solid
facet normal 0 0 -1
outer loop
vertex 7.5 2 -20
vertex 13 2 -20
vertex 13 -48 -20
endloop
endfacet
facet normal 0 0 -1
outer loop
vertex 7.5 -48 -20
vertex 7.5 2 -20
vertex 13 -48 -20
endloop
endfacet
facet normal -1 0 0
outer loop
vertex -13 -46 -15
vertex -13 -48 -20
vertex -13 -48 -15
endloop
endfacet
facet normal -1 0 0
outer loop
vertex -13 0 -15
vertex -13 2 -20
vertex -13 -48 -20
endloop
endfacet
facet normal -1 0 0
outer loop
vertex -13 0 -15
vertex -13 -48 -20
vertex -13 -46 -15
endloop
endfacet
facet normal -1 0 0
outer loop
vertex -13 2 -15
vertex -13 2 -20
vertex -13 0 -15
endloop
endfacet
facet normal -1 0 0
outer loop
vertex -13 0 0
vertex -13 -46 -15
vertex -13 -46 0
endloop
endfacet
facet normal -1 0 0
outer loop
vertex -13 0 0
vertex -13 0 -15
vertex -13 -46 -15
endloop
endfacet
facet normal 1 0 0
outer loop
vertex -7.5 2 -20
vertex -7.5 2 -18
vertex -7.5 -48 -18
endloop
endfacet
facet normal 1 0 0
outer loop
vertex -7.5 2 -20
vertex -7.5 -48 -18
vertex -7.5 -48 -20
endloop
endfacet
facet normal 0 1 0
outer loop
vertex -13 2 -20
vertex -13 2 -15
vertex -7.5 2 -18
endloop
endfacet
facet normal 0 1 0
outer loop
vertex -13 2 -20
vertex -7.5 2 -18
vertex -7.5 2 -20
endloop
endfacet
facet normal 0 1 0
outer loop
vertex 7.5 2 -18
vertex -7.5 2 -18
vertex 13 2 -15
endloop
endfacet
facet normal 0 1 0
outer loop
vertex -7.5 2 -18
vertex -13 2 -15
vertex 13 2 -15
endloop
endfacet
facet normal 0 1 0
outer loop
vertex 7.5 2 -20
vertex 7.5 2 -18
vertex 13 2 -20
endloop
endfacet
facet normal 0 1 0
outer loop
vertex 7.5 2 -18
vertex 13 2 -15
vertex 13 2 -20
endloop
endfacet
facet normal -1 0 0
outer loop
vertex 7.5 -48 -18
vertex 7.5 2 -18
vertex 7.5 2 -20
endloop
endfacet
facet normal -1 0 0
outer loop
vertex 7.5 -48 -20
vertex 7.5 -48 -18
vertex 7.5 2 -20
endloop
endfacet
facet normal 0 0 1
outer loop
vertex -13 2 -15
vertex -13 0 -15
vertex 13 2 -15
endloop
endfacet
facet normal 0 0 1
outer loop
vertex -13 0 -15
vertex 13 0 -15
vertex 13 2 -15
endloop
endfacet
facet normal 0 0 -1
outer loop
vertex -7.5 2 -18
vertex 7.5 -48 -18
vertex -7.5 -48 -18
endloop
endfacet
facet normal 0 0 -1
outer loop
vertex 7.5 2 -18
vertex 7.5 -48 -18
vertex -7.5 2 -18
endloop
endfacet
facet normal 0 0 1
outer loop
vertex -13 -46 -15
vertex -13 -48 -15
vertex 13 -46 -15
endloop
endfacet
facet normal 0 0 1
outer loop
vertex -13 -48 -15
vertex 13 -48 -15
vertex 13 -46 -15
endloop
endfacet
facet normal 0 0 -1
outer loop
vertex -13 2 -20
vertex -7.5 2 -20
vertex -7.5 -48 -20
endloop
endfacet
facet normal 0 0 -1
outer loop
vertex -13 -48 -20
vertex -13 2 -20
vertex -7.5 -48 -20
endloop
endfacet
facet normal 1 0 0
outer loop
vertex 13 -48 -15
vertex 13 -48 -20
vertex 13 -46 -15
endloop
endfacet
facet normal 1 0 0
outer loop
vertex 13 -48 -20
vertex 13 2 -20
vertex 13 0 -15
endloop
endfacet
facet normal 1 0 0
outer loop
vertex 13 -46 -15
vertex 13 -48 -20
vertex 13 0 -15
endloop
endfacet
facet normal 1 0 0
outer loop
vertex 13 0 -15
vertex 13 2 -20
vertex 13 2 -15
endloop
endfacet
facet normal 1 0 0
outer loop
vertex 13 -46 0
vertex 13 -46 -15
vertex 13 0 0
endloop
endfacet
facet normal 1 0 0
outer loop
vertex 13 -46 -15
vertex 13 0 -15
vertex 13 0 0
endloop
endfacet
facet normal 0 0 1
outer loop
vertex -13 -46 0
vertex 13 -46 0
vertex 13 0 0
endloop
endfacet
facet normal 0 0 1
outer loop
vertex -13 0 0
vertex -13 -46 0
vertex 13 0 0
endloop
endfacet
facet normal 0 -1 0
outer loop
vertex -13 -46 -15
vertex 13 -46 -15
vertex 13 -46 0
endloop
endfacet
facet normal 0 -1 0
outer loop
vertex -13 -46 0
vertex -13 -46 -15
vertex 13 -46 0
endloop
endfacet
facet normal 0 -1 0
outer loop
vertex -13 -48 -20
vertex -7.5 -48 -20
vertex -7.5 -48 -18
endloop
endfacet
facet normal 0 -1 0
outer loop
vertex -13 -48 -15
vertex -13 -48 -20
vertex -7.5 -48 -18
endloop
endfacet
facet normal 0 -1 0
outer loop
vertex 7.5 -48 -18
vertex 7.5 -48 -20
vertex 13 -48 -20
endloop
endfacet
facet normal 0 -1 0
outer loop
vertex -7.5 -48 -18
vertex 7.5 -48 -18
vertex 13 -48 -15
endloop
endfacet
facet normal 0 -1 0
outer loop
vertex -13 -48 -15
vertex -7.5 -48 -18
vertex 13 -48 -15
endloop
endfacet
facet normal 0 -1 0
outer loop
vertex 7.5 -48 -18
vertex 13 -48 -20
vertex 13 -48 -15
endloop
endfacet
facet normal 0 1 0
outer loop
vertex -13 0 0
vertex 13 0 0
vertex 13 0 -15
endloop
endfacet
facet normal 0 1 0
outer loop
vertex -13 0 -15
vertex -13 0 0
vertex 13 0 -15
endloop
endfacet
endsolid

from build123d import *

# Parameters (mm, degrees)
EXTRUDE_1_DEPTH     = 13
SKETCH_4_W          = 20
SKETCH_4_H          = 60
CUT_EXTRUDE_1_DEPTH = 7.5


with BuildPart() as part:
    # 스케치2 → 보스-돌출1 (new, symmetric)
    with BuildSketch(Plane(origin=(0, 0, 0), x_dir=(0, 0, -1), z_dir=(1, 0, 0))):
        Polygon((0, 0), (15, 0), (15, 2), (20, 2), (20, -48), (15, -48), (15, -46), (0, -46), align=None)
    extrude(amount=EXTRUDE_1_DEPTH, both=True)

    # 스케치4 → 컷-돌출1 (cut, symmetric)
    with BuildSketch(Plane(origin=(0, 0, 0), x_dir=(0, 0, -1), z_dir=(1, 0, 0))):
        with Locations((28, -23.786029553)):
            Rectangle(SKETCH_4_W, SKETCH_4_H)
    extrude(amount=CUT_EXTRUDE_1_DEPTH, both=True, mode=Mode.SUBTRACT)


solid = part.part
